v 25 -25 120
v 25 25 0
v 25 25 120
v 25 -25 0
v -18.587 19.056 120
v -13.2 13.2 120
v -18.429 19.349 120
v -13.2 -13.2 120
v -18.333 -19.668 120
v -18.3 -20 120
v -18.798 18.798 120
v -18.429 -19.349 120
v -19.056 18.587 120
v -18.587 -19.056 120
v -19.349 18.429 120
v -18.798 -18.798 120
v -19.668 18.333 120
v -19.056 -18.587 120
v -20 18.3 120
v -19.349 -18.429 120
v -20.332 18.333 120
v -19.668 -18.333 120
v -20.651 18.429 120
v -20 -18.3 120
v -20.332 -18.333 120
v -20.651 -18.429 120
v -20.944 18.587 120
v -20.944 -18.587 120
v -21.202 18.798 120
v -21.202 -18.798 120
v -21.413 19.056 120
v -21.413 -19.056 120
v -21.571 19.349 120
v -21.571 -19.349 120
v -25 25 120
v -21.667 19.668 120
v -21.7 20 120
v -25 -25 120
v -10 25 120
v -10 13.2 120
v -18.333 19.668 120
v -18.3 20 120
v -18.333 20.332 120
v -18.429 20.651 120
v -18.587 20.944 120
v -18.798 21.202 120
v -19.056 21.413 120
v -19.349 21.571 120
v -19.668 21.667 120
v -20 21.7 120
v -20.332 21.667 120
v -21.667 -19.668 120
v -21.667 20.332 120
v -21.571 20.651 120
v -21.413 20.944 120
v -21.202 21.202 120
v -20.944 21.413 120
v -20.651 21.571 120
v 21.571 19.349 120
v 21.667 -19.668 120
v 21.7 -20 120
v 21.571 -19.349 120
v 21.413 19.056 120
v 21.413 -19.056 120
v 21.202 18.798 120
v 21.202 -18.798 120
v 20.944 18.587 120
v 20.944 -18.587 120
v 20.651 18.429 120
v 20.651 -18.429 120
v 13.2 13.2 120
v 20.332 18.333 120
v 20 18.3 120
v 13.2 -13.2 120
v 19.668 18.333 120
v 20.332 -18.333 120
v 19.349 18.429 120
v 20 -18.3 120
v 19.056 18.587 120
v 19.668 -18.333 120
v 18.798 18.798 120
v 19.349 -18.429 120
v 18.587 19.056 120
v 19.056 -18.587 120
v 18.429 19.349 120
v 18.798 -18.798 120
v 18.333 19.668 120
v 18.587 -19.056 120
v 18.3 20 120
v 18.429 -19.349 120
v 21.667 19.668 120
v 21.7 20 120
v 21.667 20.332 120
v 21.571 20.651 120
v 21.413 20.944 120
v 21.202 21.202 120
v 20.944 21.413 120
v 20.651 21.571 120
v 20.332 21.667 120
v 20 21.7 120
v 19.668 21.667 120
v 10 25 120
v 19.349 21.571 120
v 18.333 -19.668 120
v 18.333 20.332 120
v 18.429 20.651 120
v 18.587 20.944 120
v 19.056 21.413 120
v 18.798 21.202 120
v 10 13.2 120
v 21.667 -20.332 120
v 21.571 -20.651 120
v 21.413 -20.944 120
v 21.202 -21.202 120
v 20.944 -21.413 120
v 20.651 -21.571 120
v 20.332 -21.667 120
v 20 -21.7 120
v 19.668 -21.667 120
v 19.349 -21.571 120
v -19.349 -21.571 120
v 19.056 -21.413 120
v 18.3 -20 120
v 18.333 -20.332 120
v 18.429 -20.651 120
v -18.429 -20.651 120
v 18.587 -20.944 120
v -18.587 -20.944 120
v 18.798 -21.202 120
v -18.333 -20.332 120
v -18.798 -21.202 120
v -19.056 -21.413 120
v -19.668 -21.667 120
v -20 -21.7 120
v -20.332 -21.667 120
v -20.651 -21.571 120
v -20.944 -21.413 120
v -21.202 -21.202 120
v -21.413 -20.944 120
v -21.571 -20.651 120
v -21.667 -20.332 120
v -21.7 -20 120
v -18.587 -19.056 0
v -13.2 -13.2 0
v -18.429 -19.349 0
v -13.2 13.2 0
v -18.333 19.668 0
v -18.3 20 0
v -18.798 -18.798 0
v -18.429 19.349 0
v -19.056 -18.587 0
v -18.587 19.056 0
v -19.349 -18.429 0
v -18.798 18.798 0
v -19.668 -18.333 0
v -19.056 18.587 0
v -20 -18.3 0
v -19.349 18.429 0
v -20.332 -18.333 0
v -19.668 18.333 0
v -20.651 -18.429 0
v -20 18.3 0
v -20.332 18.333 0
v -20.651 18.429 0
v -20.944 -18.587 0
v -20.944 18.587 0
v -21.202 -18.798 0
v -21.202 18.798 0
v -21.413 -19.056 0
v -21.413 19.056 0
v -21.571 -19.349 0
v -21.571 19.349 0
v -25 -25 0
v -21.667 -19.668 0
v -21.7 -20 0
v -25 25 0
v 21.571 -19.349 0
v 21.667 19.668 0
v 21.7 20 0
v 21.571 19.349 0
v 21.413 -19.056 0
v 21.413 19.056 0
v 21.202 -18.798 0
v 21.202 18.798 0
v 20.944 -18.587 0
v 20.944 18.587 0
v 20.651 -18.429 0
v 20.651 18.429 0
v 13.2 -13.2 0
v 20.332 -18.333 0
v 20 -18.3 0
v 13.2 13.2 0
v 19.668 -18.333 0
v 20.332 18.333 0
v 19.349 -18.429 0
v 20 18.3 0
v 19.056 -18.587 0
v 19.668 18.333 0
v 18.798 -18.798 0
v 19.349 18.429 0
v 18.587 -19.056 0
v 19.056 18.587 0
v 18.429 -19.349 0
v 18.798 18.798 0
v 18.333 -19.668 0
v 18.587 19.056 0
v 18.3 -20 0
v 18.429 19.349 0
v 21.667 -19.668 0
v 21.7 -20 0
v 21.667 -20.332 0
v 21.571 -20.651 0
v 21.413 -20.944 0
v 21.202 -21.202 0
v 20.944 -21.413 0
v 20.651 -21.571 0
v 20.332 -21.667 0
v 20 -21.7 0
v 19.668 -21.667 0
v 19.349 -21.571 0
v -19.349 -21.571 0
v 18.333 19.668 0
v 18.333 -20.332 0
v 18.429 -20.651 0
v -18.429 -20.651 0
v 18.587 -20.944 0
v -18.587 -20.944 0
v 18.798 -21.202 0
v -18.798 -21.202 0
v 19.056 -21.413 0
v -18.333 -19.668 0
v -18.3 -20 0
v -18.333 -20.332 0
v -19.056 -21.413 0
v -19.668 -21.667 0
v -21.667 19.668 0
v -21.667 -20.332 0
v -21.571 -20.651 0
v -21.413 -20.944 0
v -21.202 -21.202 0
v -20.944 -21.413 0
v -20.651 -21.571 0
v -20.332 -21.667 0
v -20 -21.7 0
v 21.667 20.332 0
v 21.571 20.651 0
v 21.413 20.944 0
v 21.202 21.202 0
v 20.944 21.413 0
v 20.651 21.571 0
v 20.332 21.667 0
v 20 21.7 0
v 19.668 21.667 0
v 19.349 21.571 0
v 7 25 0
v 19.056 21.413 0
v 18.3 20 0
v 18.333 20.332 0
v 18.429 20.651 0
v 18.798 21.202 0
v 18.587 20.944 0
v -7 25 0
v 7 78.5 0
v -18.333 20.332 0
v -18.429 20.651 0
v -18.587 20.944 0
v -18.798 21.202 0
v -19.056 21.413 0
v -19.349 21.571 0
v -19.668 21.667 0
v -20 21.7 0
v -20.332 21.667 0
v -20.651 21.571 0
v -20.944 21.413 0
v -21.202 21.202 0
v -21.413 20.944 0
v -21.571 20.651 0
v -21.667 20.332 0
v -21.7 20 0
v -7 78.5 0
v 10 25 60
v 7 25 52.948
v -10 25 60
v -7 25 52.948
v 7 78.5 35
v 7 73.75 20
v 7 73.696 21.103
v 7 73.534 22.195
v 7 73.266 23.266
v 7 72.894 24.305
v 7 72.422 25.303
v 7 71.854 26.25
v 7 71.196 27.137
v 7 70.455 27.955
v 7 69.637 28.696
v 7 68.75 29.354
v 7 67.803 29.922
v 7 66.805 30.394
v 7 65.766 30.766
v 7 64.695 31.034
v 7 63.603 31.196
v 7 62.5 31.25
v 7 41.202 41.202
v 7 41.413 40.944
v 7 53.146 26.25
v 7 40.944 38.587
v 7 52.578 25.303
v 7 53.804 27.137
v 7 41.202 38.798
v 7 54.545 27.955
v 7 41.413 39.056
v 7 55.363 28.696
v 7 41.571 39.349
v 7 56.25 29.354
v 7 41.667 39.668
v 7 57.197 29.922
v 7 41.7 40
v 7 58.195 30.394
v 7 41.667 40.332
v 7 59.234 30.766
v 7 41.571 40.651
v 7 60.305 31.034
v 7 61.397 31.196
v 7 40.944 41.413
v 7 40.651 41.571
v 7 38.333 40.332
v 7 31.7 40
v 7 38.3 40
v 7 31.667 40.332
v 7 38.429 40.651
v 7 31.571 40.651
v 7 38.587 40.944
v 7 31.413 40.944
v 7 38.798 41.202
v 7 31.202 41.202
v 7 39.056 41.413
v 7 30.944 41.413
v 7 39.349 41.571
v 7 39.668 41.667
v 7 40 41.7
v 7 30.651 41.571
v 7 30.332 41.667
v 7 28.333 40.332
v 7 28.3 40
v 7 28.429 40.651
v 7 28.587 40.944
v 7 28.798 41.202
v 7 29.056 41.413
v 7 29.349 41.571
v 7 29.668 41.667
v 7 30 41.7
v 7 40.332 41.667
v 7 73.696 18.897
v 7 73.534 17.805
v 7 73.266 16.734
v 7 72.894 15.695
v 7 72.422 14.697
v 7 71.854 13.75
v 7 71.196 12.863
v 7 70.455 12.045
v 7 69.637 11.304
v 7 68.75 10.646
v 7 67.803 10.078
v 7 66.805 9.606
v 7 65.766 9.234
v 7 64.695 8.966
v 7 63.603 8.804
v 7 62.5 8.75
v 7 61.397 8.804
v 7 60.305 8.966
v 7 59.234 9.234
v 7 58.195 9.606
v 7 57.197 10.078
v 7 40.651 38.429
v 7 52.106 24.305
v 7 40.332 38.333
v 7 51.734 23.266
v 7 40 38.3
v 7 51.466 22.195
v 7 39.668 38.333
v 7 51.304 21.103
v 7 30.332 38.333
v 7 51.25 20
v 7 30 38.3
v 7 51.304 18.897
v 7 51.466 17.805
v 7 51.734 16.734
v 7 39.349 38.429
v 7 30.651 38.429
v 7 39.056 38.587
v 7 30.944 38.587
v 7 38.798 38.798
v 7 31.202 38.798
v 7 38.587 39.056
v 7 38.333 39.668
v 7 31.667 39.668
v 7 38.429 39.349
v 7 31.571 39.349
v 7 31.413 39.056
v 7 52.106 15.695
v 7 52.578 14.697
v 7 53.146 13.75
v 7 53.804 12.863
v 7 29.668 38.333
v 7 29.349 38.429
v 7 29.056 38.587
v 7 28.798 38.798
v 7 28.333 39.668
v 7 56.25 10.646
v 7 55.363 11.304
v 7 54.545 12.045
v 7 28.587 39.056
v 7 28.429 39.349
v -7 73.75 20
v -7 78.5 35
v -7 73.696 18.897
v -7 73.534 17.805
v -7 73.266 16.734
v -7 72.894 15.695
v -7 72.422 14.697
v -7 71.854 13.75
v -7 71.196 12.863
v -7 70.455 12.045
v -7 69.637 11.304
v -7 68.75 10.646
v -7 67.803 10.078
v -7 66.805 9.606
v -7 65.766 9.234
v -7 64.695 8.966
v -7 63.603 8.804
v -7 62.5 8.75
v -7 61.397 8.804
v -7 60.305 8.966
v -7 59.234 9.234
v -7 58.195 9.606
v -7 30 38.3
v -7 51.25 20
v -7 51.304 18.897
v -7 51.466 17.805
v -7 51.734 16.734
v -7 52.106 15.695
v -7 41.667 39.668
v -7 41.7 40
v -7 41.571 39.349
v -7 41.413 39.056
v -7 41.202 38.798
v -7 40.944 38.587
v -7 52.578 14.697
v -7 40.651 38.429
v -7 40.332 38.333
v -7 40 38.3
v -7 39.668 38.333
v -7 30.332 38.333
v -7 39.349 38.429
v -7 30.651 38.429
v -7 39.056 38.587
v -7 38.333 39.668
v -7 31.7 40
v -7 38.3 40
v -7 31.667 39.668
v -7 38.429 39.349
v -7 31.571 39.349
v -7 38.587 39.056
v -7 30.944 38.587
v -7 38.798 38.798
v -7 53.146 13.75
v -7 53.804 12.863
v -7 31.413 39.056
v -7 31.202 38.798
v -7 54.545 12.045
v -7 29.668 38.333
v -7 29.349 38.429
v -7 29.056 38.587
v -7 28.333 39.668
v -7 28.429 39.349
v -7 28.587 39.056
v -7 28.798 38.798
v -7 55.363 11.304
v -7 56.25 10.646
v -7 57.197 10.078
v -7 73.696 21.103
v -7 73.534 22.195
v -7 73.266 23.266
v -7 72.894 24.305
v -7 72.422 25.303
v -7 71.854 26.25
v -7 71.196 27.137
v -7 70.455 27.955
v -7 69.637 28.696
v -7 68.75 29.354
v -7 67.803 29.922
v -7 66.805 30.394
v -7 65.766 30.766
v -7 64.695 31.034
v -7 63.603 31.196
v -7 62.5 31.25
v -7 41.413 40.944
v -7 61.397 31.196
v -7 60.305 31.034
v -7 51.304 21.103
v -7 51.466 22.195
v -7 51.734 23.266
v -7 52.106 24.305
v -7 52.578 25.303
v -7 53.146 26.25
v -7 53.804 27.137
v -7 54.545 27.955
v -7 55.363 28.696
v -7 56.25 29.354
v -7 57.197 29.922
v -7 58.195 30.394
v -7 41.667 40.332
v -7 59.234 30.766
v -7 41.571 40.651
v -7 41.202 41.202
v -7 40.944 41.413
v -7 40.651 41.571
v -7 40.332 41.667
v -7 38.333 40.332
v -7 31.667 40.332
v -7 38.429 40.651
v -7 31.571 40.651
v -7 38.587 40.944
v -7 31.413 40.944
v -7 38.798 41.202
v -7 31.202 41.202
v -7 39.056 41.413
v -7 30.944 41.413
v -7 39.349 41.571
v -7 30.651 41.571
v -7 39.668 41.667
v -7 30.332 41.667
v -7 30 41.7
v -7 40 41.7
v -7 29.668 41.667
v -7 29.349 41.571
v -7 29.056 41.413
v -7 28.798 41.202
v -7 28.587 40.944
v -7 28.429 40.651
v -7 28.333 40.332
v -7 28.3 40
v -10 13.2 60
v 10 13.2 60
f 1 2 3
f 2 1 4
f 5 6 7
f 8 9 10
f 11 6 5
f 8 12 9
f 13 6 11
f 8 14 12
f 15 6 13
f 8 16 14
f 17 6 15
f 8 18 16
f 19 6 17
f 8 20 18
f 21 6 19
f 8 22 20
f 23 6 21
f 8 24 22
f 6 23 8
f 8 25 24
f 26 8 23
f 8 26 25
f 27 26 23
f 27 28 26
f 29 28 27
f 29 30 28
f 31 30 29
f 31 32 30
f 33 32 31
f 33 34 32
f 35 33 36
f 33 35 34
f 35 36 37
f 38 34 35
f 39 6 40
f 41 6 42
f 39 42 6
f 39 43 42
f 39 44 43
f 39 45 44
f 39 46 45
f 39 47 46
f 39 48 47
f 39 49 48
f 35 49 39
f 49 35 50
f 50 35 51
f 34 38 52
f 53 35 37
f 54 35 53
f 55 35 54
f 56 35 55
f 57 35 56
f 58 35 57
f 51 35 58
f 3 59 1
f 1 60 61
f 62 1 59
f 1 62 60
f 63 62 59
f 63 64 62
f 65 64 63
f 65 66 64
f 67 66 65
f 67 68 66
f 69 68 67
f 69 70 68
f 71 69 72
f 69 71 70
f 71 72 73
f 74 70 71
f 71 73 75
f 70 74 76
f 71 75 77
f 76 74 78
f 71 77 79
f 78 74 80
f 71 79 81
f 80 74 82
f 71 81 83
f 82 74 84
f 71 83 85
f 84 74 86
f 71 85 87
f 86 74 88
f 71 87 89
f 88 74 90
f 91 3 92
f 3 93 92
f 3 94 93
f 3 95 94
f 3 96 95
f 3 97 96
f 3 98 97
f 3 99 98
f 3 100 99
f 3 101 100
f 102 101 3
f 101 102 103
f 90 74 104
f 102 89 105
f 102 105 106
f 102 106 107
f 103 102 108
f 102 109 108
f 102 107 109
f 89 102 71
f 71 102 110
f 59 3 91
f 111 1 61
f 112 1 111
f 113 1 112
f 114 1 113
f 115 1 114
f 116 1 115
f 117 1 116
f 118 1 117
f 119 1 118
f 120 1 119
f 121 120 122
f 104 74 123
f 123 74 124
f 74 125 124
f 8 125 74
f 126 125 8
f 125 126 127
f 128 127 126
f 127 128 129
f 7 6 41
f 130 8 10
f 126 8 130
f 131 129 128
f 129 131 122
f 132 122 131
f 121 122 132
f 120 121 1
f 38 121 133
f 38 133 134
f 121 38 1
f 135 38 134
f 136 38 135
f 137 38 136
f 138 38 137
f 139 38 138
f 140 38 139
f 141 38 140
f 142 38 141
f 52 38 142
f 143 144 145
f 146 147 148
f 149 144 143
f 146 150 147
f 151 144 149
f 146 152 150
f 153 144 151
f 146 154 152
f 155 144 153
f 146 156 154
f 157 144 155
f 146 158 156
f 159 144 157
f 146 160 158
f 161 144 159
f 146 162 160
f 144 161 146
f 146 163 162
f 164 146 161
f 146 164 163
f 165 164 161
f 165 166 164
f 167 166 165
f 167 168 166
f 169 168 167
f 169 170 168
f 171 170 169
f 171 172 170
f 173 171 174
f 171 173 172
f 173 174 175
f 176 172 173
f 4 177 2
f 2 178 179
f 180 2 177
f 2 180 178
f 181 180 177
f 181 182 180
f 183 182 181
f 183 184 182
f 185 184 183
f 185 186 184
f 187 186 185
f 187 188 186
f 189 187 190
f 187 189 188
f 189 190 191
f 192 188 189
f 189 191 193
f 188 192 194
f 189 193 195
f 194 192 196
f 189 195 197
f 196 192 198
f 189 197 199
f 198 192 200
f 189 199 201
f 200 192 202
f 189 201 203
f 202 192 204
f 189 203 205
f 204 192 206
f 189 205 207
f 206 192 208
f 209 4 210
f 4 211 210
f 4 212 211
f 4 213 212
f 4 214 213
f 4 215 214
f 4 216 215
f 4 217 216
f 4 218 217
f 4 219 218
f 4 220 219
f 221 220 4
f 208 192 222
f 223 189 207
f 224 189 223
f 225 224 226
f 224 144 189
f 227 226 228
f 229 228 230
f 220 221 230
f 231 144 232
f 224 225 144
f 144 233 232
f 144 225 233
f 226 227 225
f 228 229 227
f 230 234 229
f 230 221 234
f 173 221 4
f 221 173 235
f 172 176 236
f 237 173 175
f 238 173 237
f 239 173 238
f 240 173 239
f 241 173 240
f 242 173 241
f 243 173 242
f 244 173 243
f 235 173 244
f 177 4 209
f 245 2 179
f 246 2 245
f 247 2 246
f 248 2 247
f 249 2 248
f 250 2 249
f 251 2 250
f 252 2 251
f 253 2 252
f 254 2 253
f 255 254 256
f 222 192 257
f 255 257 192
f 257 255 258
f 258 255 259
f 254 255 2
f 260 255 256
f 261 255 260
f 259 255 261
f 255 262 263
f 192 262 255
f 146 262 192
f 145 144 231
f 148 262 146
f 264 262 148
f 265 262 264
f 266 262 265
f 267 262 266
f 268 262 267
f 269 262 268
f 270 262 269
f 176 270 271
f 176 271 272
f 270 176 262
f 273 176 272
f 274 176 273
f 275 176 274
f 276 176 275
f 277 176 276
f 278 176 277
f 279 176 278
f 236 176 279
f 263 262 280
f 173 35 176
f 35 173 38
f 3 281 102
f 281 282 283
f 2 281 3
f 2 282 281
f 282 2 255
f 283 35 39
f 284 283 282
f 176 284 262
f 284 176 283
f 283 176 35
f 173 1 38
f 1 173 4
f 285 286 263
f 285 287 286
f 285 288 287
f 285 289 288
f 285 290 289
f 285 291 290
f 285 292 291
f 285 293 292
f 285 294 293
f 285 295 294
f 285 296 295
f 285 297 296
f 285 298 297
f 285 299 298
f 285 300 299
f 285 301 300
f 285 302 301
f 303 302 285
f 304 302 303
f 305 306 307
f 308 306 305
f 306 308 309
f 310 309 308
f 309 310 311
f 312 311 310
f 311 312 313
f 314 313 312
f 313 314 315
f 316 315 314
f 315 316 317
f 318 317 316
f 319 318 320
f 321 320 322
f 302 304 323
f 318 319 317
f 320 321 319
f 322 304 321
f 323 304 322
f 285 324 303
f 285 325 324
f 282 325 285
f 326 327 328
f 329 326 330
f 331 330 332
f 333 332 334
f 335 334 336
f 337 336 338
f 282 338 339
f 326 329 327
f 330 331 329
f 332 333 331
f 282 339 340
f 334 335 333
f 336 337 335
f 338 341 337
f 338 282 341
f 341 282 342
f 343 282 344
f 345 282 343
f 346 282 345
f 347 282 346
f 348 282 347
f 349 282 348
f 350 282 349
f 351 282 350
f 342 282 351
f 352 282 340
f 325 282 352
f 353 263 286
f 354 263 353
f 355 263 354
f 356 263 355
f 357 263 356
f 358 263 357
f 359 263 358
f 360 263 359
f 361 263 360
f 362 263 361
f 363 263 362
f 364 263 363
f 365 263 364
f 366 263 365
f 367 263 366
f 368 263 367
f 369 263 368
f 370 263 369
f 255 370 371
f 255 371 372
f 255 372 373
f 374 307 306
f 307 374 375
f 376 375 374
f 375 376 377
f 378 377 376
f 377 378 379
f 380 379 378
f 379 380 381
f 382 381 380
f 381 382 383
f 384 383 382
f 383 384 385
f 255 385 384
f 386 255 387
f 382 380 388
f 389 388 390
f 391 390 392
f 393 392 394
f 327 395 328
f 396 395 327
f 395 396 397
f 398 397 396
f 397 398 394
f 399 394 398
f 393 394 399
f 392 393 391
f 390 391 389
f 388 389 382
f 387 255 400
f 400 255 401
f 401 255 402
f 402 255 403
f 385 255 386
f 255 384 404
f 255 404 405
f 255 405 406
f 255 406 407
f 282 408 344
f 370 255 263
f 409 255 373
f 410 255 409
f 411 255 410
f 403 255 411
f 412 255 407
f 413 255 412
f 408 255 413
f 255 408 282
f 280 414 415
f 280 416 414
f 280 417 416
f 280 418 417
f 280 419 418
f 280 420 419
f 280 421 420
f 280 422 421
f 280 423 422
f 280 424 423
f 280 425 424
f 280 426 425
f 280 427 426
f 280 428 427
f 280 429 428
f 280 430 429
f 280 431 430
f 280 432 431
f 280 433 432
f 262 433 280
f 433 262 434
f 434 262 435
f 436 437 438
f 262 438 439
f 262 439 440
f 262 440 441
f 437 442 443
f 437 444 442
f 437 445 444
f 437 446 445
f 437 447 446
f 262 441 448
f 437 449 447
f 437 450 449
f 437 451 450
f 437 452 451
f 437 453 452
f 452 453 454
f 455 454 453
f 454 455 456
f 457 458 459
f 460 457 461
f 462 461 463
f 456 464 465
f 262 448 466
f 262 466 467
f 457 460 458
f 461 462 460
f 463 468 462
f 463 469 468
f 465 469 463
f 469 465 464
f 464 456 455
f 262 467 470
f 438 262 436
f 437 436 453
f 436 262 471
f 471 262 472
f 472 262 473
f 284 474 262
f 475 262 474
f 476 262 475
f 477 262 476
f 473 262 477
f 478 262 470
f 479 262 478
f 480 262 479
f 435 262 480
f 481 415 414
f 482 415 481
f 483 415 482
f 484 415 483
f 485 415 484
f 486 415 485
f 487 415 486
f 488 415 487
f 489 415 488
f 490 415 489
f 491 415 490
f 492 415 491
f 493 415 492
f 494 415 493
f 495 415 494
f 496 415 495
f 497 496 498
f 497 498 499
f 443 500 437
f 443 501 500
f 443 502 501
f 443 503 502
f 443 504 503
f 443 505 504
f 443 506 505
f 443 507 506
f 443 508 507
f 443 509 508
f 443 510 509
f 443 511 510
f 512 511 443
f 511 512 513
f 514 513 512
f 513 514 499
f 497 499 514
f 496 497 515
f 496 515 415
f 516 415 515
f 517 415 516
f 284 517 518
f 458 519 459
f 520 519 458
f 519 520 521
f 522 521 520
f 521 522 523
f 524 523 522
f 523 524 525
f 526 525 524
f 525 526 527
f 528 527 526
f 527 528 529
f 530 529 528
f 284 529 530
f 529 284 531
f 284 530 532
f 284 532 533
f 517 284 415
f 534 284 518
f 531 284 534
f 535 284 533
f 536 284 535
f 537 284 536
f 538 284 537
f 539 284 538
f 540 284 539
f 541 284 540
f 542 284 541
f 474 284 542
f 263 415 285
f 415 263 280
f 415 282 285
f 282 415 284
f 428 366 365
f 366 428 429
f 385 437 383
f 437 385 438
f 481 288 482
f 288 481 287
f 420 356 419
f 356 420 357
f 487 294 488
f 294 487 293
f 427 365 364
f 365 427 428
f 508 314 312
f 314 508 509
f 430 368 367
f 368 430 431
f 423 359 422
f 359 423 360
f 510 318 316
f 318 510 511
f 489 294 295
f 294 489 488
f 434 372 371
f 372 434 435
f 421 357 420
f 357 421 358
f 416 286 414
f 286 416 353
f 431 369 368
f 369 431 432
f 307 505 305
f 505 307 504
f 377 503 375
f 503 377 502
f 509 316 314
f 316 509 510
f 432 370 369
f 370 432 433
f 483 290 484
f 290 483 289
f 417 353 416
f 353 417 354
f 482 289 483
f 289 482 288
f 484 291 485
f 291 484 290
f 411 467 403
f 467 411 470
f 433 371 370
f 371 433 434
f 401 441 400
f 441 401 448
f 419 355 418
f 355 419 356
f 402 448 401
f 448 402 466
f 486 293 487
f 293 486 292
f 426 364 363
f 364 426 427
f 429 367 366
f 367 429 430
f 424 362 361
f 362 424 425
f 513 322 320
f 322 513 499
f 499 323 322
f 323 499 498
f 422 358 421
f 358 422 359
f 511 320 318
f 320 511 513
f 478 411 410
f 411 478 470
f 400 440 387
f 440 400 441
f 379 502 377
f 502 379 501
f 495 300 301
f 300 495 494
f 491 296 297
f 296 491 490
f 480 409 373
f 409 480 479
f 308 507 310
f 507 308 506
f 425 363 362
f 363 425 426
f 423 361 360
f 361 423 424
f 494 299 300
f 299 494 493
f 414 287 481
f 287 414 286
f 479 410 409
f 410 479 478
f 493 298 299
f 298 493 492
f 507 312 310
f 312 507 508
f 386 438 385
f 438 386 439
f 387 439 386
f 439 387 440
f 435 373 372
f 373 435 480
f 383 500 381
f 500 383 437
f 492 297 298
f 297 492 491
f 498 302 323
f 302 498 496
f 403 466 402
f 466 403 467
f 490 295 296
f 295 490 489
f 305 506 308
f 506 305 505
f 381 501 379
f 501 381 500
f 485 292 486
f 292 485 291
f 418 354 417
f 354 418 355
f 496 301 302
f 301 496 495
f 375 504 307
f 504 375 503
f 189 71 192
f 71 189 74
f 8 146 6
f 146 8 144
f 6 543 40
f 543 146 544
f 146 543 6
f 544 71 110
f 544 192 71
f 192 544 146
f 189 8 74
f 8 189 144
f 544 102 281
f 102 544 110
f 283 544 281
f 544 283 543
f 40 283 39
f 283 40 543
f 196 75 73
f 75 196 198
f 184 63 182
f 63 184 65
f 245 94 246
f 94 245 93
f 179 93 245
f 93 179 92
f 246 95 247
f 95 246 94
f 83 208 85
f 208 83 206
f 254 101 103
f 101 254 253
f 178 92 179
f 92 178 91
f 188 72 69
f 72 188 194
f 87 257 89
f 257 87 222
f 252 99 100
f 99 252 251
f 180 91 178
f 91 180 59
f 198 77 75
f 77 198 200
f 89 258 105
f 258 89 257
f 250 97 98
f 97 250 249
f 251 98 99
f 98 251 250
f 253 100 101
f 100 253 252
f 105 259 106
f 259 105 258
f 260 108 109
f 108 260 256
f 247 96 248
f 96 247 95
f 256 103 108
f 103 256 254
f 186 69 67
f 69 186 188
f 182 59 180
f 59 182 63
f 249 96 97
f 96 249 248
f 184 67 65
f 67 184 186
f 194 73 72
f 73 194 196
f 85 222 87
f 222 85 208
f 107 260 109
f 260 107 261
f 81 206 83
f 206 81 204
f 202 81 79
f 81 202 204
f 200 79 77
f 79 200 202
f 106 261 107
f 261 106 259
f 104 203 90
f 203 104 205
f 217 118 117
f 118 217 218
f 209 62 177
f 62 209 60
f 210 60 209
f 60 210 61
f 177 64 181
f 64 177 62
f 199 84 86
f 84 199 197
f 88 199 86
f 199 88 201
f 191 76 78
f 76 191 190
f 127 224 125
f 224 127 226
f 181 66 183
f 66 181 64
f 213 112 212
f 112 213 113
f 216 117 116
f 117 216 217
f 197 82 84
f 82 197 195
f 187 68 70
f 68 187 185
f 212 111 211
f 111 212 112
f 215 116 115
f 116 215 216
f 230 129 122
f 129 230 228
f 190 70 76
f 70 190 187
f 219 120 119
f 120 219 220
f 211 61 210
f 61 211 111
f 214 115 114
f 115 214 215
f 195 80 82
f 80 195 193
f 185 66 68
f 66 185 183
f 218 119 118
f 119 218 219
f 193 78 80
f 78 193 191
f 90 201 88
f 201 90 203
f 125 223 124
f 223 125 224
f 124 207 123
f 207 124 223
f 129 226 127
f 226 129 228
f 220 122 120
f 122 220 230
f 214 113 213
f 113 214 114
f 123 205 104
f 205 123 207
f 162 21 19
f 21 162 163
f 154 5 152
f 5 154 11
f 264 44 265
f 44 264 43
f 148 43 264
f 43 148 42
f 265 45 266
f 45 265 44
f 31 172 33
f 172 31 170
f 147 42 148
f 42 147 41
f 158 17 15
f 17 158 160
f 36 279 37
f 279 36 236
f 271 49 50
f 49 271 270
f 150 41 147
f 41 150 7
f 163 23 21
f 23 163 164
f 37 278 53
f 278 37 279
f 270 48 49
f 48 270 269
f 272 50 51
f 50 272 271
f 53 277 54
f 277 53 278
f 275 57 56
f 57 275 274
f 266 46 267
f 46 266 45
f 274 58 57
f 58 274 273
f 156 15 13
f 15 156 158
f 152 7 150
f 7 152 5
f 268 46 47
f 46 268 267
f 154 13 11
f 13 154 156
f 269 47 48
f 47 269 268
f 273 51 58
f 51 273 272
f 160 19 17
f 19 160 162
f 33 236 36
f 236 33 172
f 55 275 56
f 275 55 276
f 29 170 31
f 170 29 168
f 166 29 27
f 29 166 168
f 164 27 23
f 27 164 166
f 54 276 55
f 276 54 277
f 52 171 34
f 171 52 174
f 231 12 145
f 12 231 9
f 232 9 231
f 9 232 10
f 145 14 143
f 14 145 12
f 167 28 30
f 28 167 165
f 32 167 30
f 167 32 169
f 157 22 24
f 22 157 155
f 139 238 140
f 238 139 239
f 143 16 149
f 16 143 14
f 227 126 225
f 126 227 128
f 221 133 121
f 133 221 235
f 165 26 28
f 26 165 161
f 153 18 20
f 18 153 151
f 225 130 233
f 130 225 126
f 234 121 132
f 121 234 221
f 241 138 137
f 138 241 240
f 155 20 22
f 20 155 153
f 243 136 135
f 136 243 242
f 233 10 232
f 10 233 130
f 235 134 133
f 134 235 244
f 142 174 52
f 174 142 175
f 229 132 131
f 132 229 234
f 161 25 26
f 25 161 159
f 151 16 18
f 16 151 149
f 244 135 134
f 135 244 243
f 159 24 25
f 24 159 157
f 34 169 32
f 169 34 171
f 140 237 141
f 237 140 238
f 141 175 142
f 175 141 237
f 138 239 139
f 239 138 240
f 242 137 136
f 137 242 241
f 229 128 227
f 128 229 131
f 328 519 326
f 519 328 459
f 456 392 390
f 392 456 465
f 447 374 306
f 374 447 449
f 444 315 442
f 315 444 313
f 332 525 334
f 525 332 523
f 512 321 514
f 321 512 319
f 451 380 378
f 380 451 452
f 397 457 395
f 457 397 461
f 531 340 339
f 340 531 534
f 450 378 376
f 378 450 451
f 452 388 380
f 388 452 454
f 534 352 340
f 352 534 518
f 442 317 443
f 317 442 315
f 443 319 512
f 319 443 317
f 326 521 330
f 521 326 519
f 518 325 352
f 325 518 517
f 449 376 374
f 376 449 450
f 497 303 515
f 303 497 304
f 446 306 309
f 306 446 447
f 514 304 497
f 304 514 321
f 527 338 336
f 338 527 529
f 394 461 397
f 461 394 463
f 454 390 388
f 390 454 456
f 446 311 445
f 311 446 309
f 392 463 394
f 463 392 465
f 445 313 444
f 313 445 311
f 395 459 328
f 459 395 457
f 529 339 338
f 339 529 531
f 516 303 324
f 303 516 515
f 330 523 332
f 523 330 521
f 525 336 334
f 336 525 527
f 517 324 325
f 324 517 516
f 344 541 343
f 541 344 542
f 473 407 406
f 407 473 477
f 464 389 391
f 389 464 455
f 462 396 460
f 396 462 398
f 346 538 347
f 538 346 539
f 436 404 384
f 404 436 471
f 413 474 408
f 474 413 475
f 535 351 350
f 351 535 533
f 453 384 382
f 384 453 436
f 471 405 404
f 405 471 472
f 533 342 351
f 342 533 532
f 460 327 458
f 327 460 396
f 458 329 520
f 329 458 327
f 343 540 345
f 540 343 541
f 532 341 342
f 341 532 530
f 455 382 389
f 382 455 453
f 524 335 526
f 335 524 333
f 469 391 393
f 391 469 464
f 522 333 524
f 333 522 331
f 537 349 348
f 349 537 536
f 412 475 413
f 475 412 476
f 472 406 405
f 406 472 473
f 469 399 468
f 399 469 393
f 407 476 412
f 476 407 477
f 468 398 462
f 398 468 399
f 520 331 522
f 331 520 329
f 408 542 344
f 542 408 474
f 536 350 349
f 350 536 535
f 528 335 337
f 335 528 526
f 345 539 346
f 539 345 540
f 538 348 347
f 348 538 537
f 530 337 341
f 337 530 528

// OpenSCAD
_ScrewLength = 5;
_ScrewDiameter = 3.8;
_AluWidth = 25;
_WheelDiameter = 96;
_BoltDiameter = 6.8;
_Tolerance = 0.2;

//EncoderMount2();
//Concept();
//BallBearingMount();
//Encoder();
BearingHolder();

module BearingHolder()
{
    difference()
    {
        union()
        {
            translate([0,0,60])
                cube([50,50,120], center=true);
            hull()
            {
                translate([0,0.5*(12.5+50+16),0.5*35])
                    cube([14,12.5+50+16,35], center=true);
                translate([-7,0,60])
                    cube([14,1,1]);
            }
        }
        translate([0,12.5+50,20])
        rotate([0,90,0])
        cylinder(d=22.5, h=16, $fn=64, center=true);
        translate([0,0,60])
        cube([26.4,26.4,122], center=true);
        translate([0,20,35+60])
        cube([20,40,70], center=true);
        translate([20,20,-1])
        cylinder(d=3.4,h=122,$fn=32);
        translate([20,-20,-1])
        cylinder(d=3.4,h=122,$fn=32);
        translate([-20,20,-1])
        cylinder(d=3.4,h=122,$fn=32);
        translate([-20,-20,-1])
        cylinder(d=3.4,h=122,$fn=32);
        translate([0,40,40])
        rotate([0,90,0])
        cylinder(d=3.4, h=20, $fn=32, center=true);
        translate([0,30,40])
        rotate([0,90,0])
        cylinder(d=3.4, h=20, $fn=32, center=true);
    }
}

module Encoder()
{
	translate([0,0,-30])
	union()
	{
		cylinder(d=38.8, h=30, $fn=64);
		translate([0,0,29.9])
		cylinder(d=20.8, h=5.1, $fn=64);
		translate([0,0,34.9])
		cylinder(d=6.8, h=13.1, $fn=32);

		rotate([0,0,120])
		translate([15.0111,0,29.9])
		cylinder(d=_ScrewDiameter, h=_ScrewLength, $fn=32);
		rotate([0,0,240])
		translate([15.0111,0,29.9])
		cylinder(d=_ScrewDiameter, h=_ScrewLength, $fn=32);
		translate([15.0111,0,29.9])
		cylinder(d=_ScrewDiameter, h=_ScrewLength, $fn=32);
	}
}

module Wheel()
{
	cylinder(d=_WheelDiameter, h=15, $fn=64);
}

module Concept()
{
	rotate([90,0,-90])
	union()
	{
		EncoderMount();
		translate([0,0,3])
		rotate([180,0,0])
		Encoder();
		translate([0,0,-18])
		Wheel();
	}
}

module BallBearingMount()
{
	translate([0,0,4.5])
	difference()
	{
		union()
		{
			cube([3*_AluWidth, _AluWidth, 9], center=true);
			cylinder(d=30, h=9, $fn=64, center=true);
		}
		union()
		{
			translate([0,0,1+0.5*_Tolerance])
			cylinder(d=22.4, h=7+_Tolerance, $fn=64, center=true);
			cylinder(d=13, h=0.5*_AluWidth-_Tolerance+0.2, $fn=64, center=true);
			translate([_AluWidth,0,0])
			cylinder(d=_BoltDiameter, h=0.5*_AluWidth-_Tolerance+0.2, $fn=64, center=true);
			translate([-_AluWidth,0,0])
			cylinder(d=_BoltDiameter, h=0.5*_AluWidth-_Tolerance+0.2, $fn=64, center=true);
		}		
	}
}

module Concept2()
{
	rotate([90,0,-90])
	union()
	{
		EncoderMount2();
		translate([0,0,3])
		rotate([180,0,0])
		Encoder();
		translate([0,0,-18])
		Wheel();
	}
}


module EncoderMount()
{
	difference()
	{
		hull()
		{
			cylinder(d=45, h=14, $fn=64);
			//translate([0,-22.5,0])
			//cube([70,45,14]);
			translate([55,0,0])
			cylinder(d=30, h=14, $fn=64);
		}
		union()
		{
			translate([55,0,-0.1])
			cylinder(d=22.4, h=14.2, $fn=64);
			translate([0,0,3])
			rotate([180,0,0])
			Encoder();
		}
	}
}

module EncoderMount2()
{
	difference()
	{
		hull()
		{
			cylinder(d=45, h=10, $fn=64);
			//translate([0,-22.5,0])
			//cube([70,45,14]);
			translate([4*_AluWidth-(_WheelDiameter*0.5),-_AluWidth,0])
			cube([_AluWidth,2*_AluWidth,10]);
		}
		union()
		{
			translate([4.5*_AluWidth-(_WheelDiameter*0.5),0.5*_AluWidth,-0.1])
			cylinder(d=_BoltDiameter, h=10.2, $fn=64);
			translate([4.5*_AluWidth-(_WheelDiameter*0.5),-0.5*_AluWidth,-0.1])
			cylinder(d=_BoltDiameter, h=10.2, $fn=64);
			translate([0,0,3])
			rotate([180,0,0])
			Encoder();
		}
	}
}
